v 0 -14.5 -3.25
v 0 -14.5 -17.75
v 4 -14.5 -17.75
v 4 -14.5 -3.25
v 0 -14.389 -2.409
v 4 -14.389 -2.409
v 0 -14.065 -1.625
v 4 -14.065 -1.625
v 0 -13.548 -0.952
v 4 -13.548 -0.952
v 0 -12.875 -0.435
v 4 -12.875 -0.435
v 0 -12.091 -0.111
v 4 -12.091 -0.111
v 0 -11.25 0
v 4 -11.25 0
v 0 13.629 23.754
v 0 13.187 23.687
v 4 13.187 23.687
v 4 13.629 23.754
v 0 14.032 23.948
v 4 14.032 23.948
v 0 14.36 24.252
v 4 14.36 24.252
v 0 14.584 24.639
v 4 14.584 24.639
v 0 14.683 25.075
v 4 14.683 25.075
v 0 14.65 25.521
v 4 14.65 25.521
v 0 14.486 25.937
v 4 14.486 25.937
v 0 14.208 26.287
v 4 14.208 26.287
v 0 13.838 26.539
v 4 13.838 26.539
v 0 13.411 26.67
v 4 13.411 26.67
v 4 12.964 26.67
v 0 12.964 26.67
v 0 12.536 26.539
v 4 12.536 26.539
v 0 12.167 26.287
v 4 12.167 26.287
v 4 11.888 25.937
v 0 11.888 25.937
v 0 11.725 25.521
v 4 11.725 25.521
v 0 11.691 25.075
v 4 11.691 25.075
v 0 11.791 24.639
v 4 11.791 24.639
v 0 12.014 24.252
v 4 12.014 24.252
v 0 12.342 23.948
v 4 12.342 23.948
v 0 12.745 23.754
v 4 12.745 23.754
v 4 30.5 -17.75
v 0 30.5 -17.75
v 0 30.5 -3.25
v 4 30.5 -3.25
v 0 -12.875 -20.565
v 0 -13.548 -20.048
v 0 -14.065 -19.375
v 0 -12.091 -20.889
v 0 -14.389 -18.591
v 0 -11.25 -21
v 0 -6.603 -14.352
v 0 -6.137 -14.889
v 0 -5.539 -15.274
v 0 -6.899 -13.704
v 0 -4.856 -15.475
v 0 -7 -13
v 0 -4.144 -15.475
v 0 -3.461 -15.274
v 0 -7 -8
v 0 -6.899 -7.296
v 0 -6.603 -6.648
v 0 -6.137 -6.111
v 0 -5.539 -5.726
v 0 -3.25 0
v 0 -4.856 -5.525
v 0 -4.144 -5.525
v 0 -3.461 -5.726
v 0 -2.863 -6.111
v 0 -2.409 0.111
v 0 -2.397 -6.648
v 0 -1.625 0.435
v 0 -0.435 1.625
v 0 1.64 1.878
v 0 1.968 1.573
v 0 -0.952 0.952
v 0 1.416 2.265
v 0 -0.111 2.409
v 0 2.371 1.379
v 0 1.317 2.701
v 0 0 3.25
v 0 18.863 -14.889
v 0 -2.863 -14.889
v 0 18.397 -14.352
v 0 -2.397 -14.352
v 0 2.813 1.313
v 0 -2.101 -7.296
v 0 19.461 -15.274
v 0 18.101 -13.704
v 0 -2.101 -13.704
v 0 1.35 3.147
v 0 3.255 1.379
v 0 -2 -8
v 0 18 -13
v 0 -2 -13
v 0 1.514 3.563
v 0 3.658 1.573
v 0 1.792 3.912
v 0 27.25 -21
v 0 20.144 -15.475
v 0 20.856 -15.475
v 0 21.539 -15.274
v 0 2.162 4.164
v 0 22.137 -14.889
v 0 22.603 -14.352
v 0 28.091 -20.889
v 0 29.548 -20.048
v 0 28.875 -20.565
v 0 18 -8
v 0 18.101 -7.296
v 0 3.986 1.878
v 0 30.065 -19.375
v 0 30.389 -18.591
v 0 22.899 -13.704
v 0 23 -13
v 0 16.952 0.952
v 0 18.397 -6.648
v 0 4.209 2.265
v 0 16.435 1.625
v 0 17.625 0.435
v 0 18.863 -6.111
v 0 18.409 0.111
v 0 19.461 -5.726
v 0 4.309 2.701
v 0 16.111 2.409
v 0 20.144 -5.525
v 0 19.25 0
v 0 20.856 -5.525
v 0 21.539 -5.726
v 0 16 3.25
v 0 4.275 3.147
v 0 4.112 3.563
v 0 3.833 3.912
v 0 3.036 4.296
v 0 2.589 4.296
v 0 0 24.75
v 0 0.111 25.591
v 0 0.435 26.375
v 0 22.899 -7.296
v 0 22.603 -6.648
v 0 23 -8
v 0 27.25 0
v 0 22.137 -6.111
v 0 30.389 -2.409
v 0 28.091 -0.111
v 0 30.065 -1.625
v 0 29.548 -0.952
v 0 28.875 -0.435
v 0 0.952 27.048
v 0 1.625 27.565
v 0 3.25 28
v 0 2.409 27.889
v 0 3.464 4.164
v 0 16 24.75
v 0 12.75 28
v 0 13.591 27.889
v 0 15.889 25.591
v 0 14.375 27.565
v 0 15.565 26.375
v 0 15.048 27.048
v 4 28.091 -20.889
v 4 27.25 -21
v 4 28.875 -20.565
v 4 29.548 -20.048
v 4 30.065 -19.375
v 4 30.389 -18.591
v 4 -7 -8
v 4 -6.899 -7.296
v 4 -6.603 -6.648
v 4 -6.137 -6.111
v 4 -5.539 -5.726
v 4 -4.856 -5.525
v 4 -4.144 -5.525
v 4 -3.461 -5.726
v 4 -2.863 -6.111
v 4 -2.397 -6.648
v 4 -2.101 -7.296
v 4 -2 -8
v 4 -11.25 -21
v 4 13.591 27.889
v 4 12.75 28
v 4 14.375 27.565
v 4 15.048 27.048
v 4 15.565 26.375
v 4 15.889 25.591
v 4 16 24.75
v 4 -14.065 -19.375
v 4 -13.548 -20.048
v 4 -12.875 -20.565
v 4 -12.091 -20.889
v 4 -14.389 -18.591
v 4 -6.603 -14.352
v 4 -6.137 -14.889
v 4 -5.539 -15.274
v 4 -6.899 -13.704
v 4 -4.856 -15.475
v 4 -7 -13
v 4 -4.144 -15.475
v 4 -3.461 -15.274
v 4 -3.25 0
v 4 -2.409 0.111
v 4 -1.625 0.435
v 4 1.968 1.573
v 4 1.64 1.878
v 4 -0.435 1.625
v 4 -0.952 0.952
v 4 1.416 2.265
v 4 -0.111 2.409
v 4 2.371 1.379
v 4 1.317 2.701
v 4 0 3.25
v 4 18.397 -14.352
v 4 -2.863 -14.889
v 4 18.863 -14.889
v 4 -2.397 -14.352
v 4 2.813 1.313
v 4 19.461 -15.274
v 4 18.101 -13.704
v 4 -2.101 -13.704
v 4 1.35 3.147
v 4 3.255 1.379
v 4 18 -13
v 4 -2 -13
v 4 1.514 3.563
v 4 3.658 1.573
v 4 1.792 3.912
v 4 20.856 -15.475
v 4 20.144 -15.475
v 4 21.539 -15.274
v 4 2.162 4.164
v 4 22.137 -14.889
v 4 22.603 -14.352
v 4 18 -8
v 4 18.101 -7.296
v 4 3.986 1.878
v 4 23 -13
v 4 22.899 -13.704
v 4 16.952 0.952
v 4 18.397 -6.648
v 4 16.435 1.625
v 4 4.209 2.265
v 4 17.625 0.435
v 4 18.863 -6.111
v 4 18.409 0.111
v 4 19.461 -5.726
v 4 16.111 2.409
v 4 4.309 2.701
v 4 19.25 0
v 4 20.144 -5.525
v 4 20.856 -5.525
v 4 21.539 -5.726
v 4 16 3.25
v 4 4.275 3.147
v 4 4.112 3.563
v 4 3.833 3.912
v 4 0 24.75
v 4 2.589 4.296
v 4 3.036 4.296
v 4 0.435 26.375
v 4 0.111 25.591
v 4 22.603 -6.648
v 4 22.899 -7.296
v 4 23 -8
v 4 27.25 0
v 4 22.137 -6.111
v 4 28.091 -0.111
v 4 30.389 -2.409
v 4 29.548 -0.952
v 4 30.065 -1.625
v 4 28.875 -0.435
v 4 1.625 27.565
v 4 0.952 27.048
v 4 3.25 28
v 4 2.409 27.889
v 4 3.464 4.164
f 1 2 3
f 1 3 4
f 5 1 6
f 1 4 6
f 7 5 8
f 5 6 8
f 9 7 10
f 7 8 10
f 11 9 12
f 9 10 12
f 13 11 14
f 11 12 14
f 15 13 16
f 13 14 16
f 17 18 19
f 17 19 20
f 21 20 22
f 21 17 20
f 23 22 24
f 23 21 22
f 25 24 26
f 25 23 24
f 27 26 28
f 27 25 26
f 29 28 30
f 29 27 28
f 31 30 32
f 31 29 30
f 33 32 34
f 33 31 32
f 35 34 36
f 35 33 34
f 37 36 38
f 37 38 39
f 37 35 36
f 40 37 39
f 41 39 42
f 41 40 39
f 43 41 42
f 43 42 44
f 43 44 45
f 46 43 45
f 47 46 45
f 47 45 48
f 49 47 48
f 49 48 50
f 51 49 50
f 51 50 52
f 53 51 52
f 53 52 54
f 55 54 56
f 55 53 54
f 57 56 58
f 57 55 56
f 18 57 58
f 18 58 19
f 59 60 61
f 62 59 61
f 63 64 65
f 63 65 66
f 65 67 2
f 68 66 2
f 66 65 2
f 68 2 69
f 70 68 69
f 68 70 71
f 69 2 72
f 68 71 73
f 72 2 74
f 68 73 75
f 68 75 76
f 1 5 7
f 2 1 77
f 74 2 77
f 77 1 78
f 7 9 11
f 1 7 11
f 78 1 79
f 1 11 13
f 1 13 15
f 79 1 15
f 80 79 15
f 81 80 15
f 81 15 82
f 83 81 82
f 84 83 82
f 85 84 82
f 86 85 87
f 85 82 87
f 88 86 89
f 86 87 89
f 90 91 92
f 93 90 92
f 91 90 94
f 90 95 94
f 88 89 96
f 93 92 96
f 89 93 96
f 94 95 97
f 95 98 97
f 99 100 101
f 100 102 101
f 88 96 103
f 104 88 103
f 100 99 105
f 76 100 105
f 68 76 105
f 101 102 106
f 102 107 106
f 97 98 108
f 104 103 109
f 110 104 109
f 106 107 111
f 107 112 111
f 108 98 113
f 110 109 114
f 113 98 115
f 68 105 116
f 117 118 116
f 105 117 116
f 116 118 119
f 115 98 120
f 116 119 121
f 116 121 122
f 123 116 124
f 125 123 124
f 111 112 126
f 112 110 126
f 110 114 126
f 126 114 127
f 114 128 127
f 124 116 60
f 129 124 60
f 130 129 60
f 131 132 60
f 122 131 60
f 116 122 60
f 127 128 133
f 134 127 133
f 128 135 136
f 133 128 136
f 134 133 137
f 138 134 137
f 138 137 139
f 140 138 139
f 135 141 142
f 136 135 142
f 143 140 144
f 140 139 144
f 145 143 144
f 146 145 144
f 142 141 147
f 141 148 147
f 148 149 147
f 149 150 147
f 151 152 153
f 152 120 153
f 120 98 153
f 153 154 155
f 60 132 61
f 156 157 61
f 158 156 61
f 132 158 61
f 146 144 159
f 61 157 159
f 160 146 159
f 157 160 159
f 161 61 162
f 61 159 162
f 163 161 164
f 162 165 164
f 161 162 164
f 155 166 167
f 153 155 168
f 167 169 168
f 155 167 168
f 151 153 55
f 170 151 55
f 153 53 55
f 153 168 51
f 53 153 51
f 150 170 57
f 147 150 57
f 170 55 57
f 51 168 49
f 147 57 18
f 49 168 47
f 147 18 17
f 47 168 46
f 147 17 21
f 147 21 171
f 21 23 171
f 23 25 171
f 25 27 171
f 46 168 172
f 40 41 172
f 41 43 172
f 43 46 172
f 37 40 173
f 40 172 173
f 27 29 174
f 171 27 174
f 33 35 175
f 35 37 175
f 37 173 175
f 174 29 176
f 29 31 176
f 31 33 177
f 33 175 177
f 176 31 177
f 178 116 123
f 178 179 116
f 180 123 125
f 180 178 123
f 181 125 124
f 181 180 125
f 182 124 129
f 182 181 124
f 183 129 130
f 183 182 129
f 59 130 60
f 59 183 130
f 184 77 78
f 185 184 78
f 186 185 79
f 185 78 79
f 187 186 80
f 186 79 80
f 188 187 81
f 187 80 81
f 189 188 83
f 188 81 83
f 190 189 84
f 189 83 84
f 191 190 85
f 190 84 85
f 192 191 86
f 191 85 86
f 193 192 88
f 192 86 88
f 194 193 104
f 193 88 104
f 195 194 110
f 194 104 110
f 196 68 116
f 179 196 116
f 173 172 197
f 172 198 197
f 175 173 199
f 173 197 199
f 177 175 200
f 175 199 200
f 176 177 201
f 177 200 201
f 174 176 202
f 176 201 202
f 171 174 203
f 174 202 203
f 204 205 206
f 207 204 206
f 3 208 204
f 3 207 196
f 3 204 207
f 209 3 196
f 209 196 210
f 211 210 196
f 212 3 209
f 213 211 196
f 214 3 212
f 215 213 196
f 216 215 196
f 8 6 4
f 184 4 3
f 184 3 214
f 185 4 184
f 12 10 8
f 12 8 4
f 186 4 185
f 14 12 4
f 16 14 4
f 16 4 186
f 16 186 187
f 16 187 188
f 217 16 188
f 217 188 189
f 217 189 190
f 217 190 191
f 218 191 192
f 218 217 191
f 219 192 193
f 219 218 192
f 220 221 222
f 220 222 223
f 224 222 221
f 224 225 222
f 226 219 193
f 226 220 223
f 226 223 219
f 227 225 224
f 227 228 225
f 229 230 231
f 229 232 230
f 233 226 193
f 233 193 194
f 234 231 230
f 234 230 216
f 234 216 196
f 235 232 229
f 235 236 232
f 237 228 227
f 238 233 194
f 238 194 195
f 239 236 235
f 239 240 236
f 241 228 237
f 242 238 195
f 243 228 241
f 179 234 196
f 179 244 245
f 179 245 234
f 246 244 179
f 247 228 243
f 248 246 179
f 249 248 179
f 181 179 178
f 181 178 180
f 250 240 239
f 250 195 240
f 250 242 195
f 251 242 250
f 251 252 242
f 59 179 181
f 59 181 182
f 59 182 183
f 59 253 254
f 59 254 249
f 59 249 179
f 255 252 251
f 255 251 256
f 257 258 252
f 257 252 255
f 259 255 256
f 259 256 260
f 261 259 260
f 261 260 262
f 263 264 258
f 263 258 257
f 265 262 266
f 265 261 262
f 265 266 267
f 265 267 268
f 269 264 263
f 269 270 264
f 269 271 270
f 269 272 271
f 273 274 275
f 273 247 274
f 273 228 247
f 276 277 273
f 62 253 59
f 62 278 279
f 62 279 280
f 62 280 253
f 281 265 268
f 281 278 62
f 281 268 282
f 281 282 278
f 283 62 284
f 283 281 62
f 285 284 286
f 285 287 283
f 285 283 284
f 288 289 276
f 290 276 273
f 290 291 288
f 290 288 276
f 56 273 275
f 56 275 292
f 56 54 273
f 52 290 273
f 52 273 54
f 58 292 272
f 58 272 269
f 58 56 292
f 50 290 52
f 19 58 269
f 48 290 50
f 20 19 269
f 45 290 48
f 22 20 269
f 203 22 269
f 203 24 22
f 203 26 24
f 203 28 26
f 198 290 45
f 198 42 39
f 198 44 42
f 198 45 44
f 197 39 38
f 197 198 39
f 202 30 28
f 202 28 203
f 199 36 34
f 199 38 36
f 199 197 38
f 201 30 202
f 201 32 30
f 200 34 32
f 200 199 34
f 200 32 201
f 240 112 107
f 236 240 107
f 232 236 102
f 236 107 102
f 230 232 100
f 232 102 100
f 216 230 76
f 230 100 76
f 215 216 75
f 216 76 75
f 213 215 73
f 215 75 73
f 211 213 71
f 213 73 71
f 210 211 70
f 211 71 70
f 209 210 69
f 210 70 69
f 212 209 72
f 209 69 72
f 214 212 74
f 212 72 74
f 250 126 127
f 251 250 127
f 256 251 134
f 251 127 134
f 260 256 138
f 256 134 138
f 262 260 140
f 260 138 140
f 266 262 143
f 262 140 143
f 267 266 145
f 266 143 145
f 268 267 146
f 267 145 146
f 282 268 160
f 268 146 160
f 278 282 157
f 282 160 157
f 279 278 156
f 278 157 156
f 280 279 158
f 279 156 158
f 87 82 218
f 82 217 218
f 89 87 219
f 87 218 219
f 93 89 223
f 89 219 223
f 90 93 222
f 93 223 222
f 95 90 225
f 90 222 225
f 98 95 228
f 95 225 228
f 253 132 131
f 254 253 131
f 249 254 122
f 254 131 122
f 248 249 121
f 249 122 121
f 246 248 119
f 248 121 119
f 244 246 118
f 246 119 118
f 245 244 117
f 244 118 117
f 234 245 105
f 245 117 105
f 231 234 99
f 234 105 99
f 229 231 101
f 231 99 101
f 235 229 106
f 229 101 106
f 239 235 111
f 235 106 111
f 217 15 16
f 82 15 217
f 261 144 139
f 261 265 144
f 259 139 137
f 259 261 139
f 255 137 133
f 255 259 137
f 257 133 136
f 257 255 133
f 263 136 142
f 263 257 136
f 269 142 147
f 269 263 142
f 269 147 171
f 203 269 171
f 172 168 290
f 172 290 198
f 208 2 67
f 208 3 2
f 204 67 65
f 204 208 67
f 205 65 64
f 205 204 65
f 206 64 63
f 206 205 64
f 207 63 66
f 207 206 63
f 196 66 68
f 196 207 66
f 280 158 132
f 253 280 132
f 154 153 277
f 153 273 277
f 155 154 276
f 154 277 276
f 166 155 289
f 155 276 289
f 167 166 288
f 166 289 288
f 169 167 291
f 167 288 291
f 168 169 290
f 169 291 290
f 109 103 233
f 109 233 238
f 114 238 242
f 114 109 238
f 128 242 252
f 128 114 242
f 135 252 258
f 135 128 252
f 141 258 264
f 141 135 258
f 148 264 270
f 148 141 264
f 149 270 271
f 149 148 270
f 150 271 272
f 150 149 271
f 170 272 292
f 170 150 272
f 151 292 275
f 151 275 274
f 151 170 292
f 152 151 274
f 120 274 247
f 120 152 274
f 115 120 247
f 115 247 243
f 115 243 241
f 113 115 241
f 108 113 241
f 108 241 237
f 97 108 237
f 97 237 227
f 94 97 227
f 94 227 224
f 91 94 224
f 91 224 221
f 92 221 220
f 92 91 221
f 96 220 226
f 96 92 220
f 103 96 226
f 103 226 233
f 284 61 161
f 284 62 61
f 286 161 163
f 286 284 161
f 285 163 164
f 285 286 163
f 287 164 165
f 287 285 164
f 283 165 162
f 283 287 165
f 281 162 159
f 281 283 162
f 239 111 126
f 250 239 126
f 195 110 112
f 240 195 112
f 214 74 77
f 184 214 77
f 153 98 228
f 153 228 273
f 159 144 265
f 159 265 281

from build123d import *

# Parameters (mm, degrees)
SKETCH1_W           = 16
SKETCH1_H           = 28
SKETCH1_R           = 1.5
SKETCH1_W_2         = 45
SKETCH1_H_2         = 21
BOSS_EXTRUDE1_DEPTH = 4
FILLET1_R           = 3.25


with BuildPart() as part:
    # Sketch1 → Boss-Extrude1 (new body)
    # profile 1 of 2: a face of its own
    with BuildSketch(Plane.YZ):
        with Locations((8, 14)):
            Rectangle(SKETCH1_W, SKETCH1_H)
        with Locations(Location((13.187246979, 25.187246979, 0), (0, 0, 270))):
            Circle(SKETCH1_R, mode=Mode.SUBTRACT)
        with Locations(Location((2.812753021, 2.812753021, 0), (0, 0, 270))):
            Circle(SKETCH1_R, mode=Mode.SUBTRACT)
    # profile 2 of 2: a face of its own
    with BuildSketch(Plane.YZ):
        with Locations((8, -10.5)):
            Rectangle(SKETCH1_W_2, SKETCH1_H_2)
        with BuildLine():
            Line((-2, -8), (-2, -13))
            ThreePointArc((-2, -13), (-4.5, -15.5), (-7, -13))
            Line((-7, -13), (-7, -8))
            ThreePointArc((-7, -8), (-4.5, -5.5), (-2, -8))
        make_face(mode=Mode.SUBTRACT)
        with BuildLine():
            Line((23, -8), (23, -13))
            ThreePointArc((23, -13), (20.5, -15.5), (18, -13))
            Line((18, -13), (18, -8))
            ThreePointArc((18, -8), (20.5, -5.5), (23, -8))
        make_face(mode=Mode.SUBTRACT)
    extrude(amount=BOSS_EXTRUDE1_DEPTH)

    # Fillet1
    fillet1_edges = [part.edges().sort_by_distance(p)[0] for p in [
        (2, 0, 28),
        (2, 16, 28),
        (2, 16, 0),
        (2, 30.5, 0),
        (2, 30.5, -21),
        (2, -14.5, -21),
        (2, -14.5, 0),
        (2, 0, 0),
    ]]
    fillet(fillet1_edges, radius=FILLET1_R)


solid = part.part
